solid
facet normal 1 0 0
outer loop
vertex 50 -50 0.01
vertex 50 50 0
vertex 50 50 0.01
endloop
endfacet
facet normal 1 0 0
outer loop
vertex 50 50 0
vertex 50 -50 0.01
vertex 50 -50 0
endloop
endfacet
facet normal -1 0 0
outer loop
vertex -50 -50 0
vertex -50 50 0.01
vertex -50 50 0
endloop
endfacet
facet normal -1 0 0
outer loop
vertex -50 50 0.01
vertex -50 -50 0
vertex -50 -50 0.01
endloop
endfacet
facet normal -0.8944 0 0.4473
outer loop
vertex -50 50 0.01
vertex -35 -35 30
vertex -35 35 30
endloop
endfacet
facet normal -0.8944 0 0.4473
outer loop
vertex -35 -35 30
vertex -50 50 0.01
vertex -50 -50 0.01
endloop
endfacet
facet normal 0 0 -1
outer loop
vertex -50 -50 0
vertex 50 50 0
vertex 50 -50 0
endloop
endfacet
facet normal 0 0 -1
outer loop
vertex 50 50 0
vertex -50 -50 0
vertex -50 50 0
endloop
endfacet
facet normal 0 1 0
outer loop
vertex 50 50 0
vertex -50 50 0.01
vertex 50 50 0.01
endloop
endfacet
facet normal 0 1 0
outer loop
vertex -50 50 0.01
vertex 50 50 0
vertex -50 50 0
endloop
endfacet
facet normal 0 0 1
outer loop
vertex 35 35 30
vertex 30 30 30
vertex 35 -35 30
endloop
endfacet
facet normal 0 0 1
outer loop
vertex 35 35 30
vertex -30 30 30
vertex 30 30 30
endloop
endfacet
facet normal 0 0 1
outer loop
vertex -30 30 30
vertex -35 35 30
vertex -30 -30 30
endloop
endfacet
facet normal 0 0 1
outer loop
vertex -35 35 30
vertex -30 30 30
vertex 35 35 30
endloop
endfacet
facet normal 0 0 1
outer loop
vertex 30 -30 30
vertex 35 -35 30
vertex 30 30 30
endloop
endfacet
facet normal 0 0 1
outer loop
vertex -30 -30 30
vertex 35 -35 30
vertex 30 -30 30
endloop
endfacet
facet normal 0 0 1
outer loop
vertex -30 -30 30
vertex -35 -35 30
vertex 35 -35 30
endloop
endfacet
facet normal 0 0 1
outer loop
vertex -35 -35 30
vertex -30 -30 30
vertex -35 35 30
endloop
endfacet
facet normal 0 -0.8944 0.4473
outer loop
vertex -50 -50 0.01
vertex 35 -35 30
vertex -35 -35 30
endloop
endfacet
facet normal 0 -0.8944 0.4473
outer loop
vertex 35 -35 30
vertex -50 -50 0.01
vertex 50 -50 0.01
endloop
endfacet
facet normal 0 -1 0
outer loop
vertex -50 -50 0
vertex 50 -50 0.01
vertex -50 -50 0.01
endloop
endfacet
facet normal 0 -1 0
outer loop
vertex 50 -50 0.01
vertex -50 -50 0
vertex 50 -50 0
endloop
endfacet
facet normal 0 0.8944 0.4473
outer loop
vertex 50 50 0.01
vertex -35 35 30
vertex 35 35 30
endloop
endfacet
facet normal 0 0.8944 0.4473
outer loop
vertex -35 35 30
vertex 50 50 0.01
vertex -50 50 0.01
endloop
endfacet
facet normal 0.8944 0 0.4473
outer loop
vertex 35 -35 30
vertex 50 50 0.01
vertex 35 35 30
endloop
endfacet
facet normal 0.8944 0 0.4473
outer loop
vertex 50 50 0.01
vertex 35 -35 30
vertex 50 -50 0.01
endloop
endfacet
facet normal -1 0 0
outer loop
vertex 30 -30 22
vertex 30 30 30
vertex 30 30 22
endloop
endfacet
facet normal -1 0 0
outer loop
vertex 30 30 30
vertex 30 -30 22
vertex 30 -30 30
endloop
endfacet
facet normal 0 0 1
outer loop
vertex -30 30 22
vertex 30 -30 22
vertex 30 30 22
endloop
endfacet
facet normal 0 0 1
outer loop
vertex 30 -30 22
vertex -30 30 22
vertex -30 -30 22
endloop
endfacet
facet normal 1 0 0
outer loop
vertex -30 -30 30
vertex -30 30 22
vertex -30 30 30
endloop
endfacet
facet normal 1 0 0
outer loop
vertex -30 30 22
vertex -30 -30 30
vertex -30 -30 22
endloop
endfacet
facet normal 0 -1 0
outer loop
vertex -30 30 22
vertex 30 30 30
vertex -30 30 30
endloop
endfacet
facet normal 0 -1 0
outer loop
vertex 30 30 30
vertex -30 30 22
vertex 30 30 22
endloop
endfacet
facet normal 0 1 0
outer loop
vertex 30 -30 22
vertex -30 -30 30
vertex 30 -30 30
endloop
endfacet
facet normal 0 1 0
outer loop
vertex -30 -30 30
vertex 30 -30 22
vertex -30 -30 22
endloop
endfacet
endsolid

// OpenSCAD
// Tapered riser block for raising a beaker
// Solid square frustum with a square pocket in the top face

// ---------- Dimensions (mm) ----------
base_w      = 100;   // bottom square side length (z = 0)
top_w       = 70;    // top square side length (z = height)
height      = 30;    // overall height of frustum
pocket_w    = 60;    // pocket side length
pocket_d    = 8;     // pocket depth from top face
eps         = 0.5;   // overcut past faces for clean booleans

// ---------- Model ----------
difference() {
    // Square frustum built with polyhedron-free hull of thin slabs
    hull() {
        // bottom square
        translate([-base_w/2, -base_w/2, 0])
            cube([base_w, base_w, 0.01]);
        // top square
        translate([-top_w/2, -top_w/2, height - 0.01])
            cube([top_w, top_w, 0.01]);
    }

    // Centred square pocket in the top face
    translate([-pocket_w/2, -pocket_w/2, height - pocket_d])
        cube([pocket_w, pocket_w, pocket_d + eps]);
}
